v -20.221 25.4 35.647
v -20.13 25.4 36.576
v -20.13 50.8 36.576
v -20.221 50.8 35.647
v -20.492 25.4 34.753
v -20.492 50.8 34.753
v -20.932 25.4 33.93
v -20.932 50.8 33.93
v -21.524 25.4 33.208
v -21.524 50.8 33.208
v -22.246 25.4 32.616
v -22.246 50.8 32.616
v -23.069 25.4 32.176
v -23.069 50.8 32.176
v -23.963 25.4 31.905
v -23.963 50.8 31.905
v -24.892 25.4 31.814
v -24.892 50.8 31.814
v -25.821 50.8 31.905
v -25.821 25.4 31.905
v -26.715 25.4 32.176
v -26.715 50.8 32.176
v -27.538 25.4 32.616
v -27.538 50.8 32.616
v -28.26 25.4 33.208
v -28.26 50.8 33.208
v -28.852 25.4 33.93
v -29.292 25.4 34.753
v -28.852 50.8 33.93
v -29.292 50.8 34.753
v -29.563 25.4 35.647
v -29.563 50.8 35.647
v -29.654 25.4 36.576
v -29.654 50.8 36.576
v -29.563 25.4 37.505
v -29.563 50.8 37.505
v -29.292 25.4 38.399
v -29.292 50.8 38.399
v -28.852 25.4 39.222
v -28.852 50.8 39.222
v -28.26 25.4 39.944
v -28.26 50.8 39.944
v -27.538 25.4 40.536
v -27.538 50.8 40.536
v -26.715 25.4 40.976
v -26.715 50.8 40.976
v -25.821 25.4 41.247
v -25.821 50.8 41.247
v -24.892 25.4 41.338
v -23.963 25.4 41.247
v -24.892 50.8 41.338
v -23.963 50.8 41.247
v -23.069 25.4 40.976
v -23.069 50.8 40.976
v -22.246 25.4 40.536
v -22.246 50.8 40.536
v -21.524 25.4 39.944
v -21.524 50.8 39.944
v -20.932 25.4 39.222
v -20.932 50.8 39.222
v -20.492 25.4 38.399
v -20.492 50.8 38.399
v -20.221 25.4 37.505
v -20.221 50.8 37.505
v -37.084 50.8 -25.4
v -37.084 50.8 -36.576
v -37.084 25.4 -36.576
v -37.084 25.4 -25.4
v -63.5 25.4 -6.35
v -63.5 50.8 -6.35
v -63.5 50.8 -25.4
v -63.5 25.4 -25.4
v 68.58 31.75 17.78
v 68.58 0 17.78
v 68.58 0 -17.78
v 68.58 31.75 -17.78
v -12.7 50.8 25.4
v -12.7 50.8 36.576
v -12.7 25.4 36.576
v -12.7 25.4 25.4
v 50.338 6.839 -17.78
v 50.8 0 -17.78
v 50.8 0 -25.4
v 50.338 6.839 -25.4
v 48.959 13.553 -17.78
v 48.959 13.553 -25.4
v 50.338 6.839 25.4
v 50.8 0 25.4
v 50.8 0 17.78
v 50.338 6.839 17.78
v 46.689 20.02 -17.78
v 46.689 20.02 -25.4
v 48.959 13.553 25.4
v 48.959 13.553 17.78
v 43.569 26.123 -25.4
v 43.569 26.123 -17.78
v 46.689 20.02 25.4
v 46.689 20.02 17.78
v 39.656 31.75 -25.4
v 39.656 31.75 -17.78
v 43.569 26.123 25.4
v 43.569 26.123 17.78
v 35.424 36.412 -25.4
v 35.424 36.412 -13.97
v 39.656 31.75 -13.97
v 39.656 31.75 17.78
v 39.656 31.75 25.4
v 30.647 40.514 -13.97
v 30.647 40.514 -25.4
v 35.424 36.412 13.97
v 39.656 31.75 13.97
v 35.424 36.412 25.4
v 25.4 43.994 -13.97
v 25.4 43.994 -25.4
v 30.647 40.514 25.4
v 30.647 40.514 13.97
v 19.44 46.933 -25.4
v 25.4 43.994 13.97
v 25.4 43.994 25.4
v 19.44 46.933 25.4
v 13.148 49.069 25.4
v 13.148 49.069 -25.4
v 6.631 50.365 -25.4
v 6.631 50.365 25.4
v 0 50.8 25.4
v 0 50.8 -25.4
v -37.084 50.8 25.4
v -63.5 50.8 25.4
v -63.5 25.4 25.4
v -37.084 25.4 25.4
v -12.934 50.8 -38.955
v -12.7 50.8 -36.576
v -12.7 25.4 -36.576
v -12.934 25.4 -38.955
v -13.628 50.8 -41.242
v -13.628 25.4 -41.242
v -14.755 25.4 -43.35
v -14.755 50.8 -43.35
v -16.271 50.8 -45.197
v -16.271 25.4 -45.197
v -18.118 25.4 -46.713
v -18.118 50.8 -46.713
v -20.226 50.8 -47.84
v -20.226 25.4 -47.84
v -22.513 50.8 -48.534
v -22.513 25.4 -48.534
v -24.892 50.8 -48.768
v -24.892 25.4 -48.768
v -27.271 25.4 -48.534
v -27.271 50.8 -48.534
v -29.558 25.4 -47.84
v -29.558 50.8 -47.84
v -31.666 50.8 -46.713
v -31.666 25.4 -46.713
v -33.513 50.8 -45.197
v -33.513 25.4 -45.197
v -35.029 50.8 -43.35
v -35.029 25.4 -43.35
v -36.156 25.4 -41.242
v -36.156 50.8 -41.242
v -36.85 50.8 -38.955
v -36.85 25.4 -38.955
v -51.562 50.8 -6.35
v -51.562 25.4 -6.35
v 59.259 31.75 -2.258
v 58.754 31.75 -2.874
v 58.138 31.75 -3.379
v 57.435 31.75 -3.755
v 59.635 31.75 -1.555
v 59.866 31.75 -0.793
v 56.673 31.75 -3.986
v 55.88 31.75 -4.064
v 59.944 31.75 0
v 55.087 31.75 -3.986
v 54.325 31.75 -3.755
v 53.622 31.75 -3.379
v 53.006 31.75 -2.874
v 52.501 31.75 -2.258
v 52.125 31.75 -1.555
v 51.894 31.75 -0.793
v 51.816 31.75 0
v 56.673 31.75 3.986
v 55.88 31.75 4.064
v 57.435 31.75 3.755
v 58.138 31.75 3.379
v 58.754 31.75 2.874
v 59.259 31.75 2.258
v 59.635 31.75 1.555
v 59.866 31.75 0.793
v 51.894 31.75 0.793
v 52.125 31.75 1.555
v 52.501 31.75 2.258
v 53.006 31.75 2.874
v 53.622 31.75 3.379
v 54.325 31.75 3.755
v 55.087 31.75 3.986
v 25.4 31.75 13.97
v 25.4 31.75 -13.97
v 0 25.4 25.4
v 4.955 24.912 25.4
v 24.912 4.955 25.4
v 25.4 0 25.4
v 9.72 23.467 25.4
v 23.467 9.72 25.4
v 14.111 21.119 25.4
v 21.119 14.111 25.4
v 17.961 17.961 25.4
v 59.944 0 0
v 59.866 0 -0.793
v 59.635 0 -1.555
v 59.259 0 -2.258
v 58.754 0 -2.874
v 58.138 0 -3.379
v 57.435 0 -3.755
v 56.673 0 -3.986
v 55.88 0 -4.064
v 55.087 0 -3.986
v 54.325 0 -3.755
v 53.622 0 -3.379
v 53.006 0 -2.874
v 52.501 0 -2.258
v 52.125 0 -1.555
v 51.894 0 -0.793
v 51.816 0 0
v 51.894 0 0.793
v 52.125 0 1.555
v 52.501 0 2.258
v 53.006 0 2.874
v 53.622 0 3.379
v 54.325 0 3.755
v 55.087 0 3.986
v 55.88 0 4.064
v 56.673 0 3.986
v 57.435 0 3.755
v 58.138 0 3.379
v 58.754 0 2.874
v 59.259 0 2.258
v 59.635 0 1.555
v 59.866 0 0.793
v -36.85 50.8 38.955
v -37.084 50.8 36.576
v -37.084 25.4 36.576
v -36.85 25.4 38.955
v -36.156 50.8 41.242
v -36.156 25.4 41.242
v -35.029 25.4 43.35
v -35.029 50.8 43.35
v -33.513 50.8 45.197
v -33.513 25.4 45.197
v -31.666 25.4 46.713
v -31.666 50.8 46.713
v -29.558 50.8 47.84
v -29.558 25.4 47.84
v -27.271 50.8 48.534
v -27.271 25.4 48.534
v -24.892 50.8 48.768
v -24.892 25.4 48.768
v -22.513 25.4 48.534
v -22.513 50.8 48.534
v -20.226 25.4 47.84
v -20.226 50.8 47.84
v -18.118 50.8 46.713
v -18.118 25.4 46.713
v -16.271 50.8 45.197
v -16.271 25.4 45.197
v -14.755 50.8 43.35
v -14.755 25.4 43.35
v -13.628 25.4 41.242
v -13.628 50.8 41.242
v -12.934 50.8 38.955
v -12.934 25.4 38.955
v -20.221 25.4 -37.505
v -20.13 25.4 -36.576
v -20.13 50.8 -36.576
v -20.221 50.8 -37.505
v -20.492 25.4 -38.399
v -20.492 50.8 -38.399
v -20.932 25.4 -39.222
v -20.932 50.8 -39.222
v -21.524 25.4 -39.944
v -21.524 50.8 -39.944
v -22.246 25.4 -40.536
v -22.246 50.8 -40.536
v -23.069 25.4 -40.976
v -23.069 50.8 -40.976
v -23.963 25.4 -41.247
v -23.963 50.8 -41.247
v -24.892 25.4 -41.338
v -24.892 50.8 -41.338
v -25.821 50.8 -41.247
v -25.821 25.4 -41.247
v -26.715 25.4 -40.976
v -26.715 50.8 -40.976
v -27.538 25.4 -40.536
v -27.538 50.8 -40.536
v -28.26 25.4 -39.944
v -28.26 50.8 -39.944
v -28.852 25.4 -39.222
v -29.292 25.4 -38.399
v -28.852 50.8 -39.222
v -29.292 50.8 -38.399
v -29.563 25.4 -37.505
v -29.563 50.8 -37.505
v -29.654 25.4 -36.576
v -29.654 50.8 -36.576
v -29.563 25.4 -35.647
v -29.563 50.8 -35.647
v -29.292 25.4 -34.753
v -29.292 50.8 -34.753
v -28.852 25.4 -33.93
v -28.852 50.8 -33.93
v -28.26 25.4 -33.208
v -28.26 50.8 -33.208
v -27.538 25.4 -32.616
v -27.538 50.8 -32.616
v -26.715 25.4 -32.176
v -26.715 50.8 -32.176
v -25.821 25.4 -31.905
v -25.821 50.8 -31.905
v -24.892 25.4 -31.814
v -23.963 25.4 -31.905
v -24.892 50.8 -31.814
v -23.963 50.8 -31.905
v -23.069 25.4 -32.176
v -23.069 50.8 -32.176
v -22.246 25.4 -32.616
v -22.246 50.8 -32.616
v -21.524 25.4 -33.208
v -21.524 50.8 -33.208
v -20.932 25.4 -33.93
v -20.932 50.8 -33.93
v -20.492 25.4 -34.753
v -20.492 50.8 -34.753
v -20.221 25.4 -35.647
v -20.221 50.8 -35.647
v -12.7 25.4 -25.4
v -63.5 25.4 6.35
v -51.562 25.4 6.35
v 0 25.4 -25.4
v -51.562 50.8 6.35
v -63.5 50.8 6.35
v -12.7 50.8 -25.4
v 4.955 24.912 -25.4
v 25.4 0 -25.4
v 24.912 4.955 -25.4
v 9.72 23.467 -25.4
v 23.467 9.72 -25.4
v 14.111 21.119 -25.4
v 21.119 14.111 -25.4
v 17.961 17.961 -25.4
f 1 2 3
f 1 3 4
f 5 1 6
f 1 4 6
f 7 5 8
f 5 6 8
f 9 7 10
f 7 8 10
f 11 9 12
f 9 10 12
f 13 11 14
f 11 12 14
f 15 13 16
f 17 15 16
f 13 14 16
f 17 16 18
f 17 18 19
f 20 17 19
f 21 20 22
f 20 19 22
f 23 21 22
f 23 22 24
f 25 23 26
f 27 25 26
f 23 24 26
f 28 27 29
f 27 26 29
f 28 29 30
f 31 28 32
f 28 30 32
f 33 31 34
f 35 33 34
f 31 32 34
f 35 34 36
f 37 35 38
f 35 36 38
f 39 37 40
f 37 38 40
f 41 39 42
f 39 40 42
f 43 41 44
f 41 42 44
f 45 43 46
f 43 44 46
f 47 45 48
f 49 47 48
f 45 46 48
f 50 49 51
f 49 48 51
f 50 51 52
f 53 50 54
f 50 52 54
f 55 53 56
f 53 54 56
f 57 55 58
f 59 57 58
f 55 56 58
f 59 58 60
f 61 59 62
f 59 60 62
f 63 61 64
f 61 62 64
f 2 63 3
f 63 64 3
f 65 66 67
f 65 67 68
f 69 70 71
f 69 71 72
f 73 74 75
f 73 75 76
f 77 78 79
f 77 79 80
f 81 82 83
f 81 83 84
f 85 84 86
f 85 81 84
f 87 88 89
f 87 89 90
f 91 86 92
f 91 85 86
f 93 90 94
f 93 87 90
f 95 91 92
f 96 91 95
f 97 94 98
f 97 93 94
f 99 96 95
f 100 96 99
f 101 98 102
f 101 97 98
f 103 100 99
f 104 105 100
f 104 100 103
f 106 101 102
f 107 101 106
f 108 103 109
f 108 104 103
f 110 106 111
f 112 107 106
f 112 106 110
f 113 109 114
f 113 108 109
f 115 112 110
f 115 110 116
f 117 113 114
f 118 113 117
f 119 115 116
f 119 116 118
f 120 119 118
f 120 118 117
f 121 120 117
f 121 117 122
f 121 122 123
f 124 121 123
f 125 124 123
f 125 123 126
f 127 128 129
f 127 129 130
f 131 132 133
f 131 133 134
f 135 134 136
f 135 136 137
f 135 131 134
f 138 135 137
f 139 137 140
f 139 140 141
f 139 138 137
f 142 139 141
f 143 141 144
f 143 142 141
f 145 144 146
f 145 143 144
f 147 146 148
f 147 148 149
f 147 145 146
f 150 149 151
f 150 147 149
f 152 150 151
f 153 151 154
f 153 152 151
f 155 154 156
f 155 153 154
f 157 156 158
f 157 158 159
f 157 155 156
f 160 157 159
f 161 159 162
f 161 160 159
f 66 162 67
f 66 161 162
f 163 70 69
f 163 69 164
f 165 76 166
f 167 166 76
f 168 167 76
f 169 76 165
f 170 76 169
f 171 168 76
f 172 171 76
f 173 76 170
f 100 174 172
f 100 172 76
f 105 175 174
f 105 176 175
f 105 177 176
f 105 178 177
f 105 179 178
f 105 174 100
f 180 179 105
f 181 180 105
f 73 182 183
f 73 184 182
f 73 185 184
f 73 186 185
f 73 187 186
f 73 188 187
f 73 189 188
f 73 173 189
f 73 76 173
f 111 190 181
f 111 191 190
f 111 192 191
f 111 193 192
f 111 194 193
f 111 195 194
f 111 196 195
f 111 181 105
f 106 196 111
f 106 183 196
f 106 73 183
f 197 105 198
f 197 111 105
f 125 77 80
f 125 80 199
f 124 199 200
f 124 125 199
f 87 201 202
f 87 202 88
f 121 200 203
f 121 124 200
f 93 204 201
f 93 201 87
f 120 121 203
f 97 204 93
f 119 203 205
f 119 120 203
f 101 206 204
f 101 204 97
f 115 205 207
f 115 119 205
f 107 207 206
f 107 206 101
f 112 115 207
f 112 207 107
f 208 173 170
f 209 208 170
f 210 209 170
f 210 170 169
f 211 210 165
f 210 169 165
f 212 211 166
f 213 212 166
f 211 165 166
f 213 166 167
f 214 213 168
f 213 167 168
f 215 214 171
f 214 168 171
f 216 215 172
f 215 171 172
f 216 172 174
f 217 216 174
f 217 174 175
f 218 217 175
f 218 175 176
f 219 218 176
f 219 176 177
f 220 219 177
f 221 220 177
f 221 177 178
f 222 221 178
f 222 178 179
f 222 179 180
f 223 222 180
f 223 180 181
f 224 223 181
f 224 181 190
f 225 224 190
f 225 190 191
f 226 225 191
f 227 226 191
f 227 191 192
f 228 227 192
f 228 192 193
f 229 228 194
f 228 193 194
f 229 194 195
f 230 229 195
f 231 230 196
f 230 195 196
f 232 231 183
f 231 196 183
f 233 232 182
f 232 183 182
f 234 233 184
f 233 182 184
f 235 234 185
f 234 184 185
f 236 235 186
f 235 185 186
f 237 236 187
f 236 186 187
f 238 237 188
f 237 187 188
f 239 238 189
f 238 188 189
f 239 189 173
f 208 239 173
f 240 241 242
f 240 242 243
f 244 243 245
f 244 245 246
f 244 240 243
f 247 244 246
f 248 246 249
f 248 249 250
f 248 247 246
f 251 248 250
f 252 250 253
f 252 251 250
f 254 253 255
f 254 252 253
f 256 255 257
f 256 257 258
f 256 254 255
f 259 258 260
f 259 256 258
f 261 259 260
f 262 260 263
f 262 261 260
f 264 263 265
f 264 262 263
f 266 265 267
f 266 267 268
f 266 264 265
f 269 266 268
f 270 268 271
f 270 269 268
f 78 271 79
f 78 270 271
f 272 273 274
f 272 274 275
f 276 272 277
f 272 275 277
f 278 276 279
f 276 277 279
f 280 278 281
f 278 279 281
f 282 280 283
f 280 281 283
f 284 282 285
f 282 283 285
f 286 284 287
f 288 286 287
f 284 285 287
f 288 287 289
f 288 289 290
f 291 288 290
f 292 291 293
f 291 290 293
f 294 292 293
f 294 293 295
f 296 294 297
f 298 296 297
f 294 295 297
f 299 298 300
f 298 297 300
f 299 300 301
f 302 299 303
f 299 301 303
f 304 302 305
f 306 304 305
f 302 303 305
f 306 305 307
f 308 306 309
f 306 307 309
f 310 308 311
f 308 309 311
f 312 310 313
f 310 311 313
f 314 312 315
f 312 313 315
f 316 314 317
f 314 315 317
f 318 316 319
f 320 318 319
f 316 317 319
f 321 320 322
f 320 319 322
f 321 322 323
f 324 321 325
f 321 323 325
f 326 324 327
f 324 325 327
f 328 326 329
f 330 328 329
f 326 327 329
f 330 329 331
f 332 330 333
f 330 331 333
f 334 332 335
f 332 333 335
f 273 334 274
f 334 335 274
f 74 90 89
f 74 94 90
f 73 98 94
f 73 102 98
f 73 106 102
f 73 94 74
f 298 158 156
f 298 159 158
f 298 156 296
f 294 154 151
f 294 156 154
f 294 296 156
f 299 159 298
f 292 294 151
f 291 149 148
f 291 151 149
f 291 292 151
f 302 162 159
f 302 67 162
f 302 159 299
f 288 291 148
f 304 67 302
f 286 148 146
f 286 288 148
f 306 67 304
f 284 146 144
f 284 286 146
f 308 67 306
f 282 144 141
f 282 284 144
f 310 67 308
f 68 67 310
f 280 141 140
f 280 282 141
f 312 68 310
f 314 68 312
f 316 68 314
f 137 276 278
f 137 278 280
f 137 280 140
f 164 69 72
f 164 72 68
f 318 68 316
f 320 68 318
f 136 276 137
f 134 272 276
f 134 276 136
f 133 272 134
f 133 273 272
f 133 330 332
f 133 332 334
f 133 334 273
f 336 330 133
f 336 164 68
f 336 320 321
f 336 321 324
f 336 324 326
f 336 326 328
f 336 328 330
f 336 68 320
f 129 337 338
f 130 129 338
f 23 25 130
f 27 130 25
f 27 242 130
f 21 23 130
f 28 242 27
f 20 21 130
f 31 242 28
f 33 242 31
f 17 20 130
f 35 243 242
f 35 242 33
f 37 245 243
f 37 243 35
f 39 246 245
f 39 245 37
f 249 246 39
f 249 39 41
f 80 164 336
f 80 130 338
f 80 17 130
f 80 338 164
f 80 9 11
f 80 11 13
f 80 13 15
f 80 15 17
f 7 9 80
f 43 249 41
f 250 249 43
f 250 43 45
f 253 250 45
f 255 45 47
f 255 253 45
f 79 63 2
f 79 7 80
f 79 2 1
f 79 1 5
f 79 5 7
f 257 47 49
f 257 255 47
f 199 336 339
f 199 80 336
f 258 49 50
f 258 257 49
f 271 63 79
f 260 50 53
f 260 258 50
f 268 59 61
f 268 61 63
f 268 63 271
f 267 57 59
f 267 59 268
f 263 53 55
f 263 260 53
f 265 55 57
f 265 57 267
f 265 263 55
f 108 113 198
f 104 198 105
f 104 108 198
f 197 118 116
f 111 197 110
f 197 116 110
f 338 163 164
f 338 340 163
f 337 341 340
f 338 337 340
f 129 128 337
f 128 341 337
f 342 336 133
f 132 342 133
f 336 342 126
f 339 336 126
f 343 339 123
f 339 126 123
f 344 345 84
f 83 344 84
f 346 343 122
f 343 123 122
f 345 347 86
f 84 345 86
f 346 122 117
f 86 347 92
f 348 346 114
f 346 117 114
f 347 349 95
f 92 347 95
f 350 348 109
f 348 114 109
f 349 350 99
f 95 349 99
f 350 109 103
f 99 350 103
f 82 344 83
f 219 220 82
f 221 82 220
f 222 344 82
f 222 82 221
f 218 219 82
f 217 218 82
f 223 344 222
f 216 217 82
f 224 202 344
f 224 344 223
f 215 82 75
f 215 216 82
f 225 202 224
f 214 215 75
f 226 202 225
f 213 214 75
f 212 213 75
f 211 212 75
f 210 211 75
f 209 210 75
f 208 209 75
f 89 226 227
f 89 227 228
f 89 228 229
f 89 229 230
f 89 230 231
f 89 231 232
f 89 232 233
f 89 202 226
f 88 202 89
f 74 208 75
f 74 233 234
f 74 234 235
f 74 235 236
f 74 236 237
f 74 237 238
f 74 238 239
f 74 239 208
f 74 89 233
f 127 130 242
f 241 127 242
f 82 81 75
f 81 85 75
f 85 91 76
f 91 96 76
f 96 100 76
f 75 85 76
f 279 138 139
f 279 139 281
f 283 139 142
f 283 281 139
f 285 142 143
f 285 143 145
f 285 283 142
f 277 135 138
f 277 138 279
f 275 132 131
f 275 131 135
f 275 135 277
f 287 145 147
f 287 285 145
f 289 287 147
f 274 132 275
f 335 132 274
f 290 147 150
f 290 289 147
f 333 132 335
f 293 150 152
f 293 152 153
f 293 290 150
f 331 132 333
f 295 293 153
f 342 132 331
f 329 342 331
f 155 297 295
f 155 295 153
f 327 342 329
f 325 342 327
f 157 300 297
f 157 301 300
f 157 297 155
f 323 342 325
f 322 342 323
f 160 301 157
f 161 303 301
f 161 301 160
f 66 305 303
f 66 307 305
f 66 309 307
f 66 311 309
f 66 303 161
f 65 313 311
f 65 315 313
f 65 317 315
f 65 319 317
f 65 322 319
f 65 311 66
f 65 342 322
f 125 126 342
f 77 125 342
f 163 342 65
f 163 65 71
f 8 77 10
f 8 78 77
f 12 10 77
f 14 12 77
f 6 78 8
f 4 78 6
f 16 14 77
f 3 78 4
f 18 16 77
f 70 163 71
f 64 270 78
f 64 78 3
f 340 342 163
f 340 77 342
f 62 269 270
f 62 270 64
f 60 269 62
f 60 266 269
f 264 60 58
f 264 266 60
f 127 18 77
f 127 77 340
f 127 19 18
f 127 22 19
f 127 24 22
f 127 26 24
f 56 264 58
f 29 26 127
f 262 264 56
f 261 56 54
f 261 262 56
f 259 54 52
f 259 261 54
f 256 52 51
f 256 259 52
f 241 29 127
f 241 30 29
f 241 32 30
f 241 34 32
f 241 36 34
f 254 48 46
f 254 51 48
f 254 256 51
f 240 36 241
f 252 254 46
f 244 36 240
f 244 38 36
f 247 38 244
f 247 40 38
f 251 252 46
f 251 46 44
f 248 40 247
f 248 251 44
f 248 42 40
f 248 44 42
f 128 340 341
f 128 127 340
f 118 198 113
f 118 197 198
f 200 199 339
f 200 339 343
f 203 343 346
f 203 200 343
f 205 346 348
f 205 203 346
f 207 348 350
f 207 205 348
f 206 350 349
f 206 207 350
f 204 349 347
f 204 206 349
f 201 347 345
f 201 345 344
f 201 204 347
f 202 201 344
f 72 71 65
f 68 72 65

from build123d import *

# Parameters (mm, degrees)
BOSS_EXTRUDE1_DEPTH = 6.35
BOSS_EXTRUDE2_START = 6.35
SKETCH1_3_W         = 11.938
SKETCH1_3_H         = 19.05
SKETCH1_3_H_2       = 6.35
BOSS_EXTRUDE2_DEPTH = 7.62
BOSS_EXTRUDE3_START = 13.97
SKETCH1_7_W         = 11.938
SKETCH1_7_H         = 19.05
SKETCH1_7_H_2       = 6.35
BOSS_EXTRUDE3_DEPTH = 3.81
BOSS_EXTRUDE4_START = 17.78
SKETCH1_10_W        = 11.938
SKETCH1_10_H        = 6.35
SKETCH1_10_H_2      = 19.05
BOSS_EXTRUDE4_DEPTH = 7.62
SKETCH2_R           = 4.7625
BOSS_EXTRUDE5_DEPTH = 25.4
SKETCH3_R           = 4.064
CUT_EXTRUDE1_DEPTH  = 32.75


with BuildPart() as part:
    # Sketch1 → Boss-Extrude1 (new body)
    with BuildSketch(Plane.XY):
        with BuildLine():
            ThreePointArc((0, 25.4), (17.960512242, 17.960512242), (25.4, 0))
            Line((25.4, 0), (25.4, 31.75))
            Line((25.4, 31.75), (-51.562, 31.75))
            Line((-51.562, 31.75), (-51.562, 25.4))
            Line((-51.562, 25.4), (0, 25.4))
        make_face()
        with BuildLine():
            Line((-51.562, 31.75), (25.4, 31.75))
            Line((25.4, 31.75), (25.4, 43.994090512))
            ThreePointArc((25.4, 43.994090512), (13.148007491, 49.069031975), (0, 50.8))
            Line((0, 50.8), (-51.562, 50.8))
            Line((-51.562, 50.8), (-51.562, 31.75))
        make_face()
        with BuildLine():
            Line((25.4, 31.75), (25.4, 0))
            Line((25.4, 0), (50.8, 0))
            ThreePointArc((50.8, 0), (47.933033778, 16.824514045), (39.65573729, 31.75))
            Line((39.65573729, 31.75), (25.4, 31.75))
        make_face()
        with BuildLine():
            ThreePointArc((39.65573729, 31.75), (47.933033778, 16.824514045), (50.8, 0))
            Line((50.8, 0), (68.58, 0))
            Line((68.58, 0), (68.58, 31.75))
            Line((68.58, 31.75), (39.65573729, 31.75))
        make_face()
    boss_extrude1 = extrude(amount=BOSS_EXTRUDE1_DEPTH)

    # Sketch1<3> → Boss-Extrude2 (add)
    with BuildSketch(Plane.XY.offset(BOSS_EXTRUDE2_START)):
        with BuildLine():
            Line((-51.562, 31.75), (25.4, 31.75))
            Line((25.4, 31.75), (25.4, 43.994090512))
            ThreePointArc((25.4, 43.994090512), (13.148007491, 49.069031975), (0, 50.8))
            Line((0, 50.8), (-51.562, 50.8))
            Line((-51.562, 50.8), (-51.562, 31.75))
        make_face()
        with BuildLine():
            ThreePointArc((0, 25.4), (17.960512242, 17.960512242), (25.4, 0))
            Line((25.4, 0), (25.4, 31.75))
            Line((25.4, 31.75), (-51.562, 31.75))
            Line((-51.562, 31.75), (-51.562, 25.4))
            Line((-51.562, 25.4), (0, 25.4))
        make_face()
        with Locations((-57.531, 41.275)):
            Rectangle(SKETCH1_3_W, SKETCH1_3_H)
        with BuildLine():
            Line((25.4, 31.75), (25.4, 0))
            Line((25.4, 0), (50.8, 0))
            ThreePointArc((50.8, 0), (47.933033778, 16.824514045), (39.65573729, 31.75))
            Line((39.65573729, 31.75), (25.4, 31.75))
        make_face()
        with BuildLine():
            ThreePointArc((39.65573729, 31.75), (47.933033778, 16.824514045), (50.8, 0))
            Line((50.8, 0), (68.58, 0))
            Line((68.58, 0), (68.58, 31.75))
            Line((68.58, 31.75), (39.65573729, 31.75))
        make_face()
        with Locations((-57.531, 28.575)):
            Rectangle(SKETCH1_3_W, SKETCH1_3_H_2)
    boss_extrude2 = extrude(amount=BOSS_EXTRUDE2_DEPTH)

    # Sketch1<7> → Boss-Extrude3 (add)
    with BuildSketch(Plane.XY.offset(BOSS_EXTRUDE3_START)):
        with BuildLine():
            Line((-51.562, 31.75), (25.4, 31.75))
            Line((25.4, 31.75), (25.4, 43.994090512))
            ThreePointArc((25.4, 43.994090512), (13.148007491, 49.069031975), (0, 50.8))
            Line((0, 50.8), (-51.562, 50.8))
            Line((-51.562, 50.8), (-51.562, 31.75))
        make_face()
        with BuildLine():
            ThreePointArc((0, 25.4), (17.960512242, 17.960512242), (25.4, 0))
            Line((25.4, 0), (25.4, 31.75))
            Line((25.4, 31.75), (-51.562, 31.75))
            Line((-51.562, 31.75), (-51.562, 25.4))
            Line((-51.562, 25.4), (0, 25.4))
        make_face()
        with BuildLine():
            Line((25.4, 31.75), (25.4, 0))
            Line((25.4, 0), (50.8, 0))
            ThreePointArc((50.8, 0), (47.933033778, 16.824514045), (39.65573729, 31.75))
            Line((39.65573729, 31.75), (25.4, 31.75))
        make_face()
        with BuildLine():
            Line((25.4, 43.994090512), (25.4, 31.75))
            Line((25.4, 31.75), (39.65573729, 31.75))
            ThreePointArc((39.65573729, 31.75), (33.09896791, 38.536973458), (25.4, 43.994090512))
        make_face()
        with Locations((-57.531, 41.275)):
            Rectangle(SKETCH1_7_W, SKETCH1_7_H)
        with Locations((-57.531, 28.575)):
            Rectangle(SKETCH1_7_W, SKETCH1_7_H_2)
        with BuildLine():
            ThreePointArc((39.65573729, 31.75), (47.933033778, 16.824514045), (50.8, 0))
            Line((50.8, 0), (68.58, 0))
            Line((68.58, 0), (68.58, 31.75))
            Line((68.58, 31.75), (39.65573729, 31.75))
        make_face()
    boss_extrude3 = extrude(amount=BOSS_EXTRUDE3_DEPTH)

    # Sketch1<10> → Boss-Extrude4 (add)
    with BuildSketch(Plane.XY.offset(BOSS_EXTRUDE4_START)):
        with BuildLine():
            Line((-51.562, 31.75), (25.4, 31.75))
            Line((25.4, 31.75), (25.4, 43.994090512))
            ThreePointArc((25.4, 43.994090512), (13.148007491, 49.069031975), (0, 50.8))
            Line((0, 50.8), (-51.562, 50.8))
            Line((-51.562, 50.8), (-51.562, 31.75))
        make_face()
        with BuildLine():
            ThreePointArc((0, 25.4), (17.960512242, 17.960512242), (25.4, 0))
            Line((25.4, 0), (25.4, 31.75))
            Line((25.4, 31.75), (-51.562, 31.75))
            Line((-51.562, 31.75), (-51.562, 25.4))
            Line((-51.562, 25.4), (0, 25.4))
        make_face()
        with Locations((-57.531, 28.575)):
            Rectangle(SKETCH1_10_W, SKETCH1_10_H)
        with Locations((-57.531, 41.275)):
            Rectangle(SKETCH1_10_W, SKETCH1_10_H_2)
        with BuildLine():
            Line((25.4, 43.994090512), (25.4, 31.75))
            Line((25.4, 31.75), (39.65573729, 31.75))
            ThreePointArc((39.65573729, 31.75), (33.09896791, 38.536973458), (25.4, 43.994090512))
        make_face()
        with BuildLine():
            Line((25.4, 31.75), (25.4, 0))
            Line((25.4, 0), (50.8, 0))
            ThreePointArc((50.8, 0), (47.933033778, 16.824514045), (39.65573729, 31.75))
            Line((39.65573729, 31.75), (25.4, 31.75))
        make_face()
    boss_extrude4 = extrude(amount=BOSS_EXTRUDE4_DEPTH)

    # Mirror7: Boss-Extrude1, Boss-Extrude2, Boss-Extrude3, Boss-Extrude4 across plane
    add(boss_extrude1.mirror(Plane.XY))
    add(boss_extrude2.mirror(Plane.XY))
    add(boss_extrude3.mirror(Plane.XY))
    add(boss_extrude4.mirror(Plane.XY))

    # Sketch2 → Boss-Extrude5 (add)
    with BuildSketch(Plane(origin=(0, 50.8, 0), x_dir=(1, 0, 0), z_dir=(0, 1, 0))):
        with BuildLine():
            Line((-12.7, 25.4), (-12.7, 36.576))
            ThreePointArc((-12.7, 36.576), (-24.892, 48.768), (-37.084, 36.576))
            Line((-37.084, 36.576), (-37.084, 25.4))
            Line((-37.084, 25.4), (-12.7, 25.4))
        make_face()
        with Locations((-24.892, 36.576)):
            Circle(SKETCH2_R, mode=Mode.SUBTRACT)
        with BuildLine():
            Line((-37.084, -25.4), (-37.084, -36.576))
            ThreePointArc((-37.084, -36.576), (-24.892, -48.768), (-12.7, -36.576))
            Line((-12.7, -36.576), (-12.7, -25.4))
            Line((-12.7, -25.4), (-37.084, -25.4))
        make_face()
        with Locations((-24.892, -36.576)):
            Circle(SKETCH2_R, mode=Mode.SUBTRACT)
    extrude(amount=-BOSS_EXTRUDE5_DEPTH)

    # Sketch3 → Cut-Extrude1 (cut, through all)
    with BuildSketch(Plane(origin=(0, 31.75, 0), x_dir=(1, 0, 0), z_dir=(0, 1, 0))):
        with Locations((55.88, 0)):
            Circle(SKETCH3_R)
    extrude(amount=-CUT_EXTRUDE1_DEPTH, mode=Mode.SUBTRACT)


solid = part.part
